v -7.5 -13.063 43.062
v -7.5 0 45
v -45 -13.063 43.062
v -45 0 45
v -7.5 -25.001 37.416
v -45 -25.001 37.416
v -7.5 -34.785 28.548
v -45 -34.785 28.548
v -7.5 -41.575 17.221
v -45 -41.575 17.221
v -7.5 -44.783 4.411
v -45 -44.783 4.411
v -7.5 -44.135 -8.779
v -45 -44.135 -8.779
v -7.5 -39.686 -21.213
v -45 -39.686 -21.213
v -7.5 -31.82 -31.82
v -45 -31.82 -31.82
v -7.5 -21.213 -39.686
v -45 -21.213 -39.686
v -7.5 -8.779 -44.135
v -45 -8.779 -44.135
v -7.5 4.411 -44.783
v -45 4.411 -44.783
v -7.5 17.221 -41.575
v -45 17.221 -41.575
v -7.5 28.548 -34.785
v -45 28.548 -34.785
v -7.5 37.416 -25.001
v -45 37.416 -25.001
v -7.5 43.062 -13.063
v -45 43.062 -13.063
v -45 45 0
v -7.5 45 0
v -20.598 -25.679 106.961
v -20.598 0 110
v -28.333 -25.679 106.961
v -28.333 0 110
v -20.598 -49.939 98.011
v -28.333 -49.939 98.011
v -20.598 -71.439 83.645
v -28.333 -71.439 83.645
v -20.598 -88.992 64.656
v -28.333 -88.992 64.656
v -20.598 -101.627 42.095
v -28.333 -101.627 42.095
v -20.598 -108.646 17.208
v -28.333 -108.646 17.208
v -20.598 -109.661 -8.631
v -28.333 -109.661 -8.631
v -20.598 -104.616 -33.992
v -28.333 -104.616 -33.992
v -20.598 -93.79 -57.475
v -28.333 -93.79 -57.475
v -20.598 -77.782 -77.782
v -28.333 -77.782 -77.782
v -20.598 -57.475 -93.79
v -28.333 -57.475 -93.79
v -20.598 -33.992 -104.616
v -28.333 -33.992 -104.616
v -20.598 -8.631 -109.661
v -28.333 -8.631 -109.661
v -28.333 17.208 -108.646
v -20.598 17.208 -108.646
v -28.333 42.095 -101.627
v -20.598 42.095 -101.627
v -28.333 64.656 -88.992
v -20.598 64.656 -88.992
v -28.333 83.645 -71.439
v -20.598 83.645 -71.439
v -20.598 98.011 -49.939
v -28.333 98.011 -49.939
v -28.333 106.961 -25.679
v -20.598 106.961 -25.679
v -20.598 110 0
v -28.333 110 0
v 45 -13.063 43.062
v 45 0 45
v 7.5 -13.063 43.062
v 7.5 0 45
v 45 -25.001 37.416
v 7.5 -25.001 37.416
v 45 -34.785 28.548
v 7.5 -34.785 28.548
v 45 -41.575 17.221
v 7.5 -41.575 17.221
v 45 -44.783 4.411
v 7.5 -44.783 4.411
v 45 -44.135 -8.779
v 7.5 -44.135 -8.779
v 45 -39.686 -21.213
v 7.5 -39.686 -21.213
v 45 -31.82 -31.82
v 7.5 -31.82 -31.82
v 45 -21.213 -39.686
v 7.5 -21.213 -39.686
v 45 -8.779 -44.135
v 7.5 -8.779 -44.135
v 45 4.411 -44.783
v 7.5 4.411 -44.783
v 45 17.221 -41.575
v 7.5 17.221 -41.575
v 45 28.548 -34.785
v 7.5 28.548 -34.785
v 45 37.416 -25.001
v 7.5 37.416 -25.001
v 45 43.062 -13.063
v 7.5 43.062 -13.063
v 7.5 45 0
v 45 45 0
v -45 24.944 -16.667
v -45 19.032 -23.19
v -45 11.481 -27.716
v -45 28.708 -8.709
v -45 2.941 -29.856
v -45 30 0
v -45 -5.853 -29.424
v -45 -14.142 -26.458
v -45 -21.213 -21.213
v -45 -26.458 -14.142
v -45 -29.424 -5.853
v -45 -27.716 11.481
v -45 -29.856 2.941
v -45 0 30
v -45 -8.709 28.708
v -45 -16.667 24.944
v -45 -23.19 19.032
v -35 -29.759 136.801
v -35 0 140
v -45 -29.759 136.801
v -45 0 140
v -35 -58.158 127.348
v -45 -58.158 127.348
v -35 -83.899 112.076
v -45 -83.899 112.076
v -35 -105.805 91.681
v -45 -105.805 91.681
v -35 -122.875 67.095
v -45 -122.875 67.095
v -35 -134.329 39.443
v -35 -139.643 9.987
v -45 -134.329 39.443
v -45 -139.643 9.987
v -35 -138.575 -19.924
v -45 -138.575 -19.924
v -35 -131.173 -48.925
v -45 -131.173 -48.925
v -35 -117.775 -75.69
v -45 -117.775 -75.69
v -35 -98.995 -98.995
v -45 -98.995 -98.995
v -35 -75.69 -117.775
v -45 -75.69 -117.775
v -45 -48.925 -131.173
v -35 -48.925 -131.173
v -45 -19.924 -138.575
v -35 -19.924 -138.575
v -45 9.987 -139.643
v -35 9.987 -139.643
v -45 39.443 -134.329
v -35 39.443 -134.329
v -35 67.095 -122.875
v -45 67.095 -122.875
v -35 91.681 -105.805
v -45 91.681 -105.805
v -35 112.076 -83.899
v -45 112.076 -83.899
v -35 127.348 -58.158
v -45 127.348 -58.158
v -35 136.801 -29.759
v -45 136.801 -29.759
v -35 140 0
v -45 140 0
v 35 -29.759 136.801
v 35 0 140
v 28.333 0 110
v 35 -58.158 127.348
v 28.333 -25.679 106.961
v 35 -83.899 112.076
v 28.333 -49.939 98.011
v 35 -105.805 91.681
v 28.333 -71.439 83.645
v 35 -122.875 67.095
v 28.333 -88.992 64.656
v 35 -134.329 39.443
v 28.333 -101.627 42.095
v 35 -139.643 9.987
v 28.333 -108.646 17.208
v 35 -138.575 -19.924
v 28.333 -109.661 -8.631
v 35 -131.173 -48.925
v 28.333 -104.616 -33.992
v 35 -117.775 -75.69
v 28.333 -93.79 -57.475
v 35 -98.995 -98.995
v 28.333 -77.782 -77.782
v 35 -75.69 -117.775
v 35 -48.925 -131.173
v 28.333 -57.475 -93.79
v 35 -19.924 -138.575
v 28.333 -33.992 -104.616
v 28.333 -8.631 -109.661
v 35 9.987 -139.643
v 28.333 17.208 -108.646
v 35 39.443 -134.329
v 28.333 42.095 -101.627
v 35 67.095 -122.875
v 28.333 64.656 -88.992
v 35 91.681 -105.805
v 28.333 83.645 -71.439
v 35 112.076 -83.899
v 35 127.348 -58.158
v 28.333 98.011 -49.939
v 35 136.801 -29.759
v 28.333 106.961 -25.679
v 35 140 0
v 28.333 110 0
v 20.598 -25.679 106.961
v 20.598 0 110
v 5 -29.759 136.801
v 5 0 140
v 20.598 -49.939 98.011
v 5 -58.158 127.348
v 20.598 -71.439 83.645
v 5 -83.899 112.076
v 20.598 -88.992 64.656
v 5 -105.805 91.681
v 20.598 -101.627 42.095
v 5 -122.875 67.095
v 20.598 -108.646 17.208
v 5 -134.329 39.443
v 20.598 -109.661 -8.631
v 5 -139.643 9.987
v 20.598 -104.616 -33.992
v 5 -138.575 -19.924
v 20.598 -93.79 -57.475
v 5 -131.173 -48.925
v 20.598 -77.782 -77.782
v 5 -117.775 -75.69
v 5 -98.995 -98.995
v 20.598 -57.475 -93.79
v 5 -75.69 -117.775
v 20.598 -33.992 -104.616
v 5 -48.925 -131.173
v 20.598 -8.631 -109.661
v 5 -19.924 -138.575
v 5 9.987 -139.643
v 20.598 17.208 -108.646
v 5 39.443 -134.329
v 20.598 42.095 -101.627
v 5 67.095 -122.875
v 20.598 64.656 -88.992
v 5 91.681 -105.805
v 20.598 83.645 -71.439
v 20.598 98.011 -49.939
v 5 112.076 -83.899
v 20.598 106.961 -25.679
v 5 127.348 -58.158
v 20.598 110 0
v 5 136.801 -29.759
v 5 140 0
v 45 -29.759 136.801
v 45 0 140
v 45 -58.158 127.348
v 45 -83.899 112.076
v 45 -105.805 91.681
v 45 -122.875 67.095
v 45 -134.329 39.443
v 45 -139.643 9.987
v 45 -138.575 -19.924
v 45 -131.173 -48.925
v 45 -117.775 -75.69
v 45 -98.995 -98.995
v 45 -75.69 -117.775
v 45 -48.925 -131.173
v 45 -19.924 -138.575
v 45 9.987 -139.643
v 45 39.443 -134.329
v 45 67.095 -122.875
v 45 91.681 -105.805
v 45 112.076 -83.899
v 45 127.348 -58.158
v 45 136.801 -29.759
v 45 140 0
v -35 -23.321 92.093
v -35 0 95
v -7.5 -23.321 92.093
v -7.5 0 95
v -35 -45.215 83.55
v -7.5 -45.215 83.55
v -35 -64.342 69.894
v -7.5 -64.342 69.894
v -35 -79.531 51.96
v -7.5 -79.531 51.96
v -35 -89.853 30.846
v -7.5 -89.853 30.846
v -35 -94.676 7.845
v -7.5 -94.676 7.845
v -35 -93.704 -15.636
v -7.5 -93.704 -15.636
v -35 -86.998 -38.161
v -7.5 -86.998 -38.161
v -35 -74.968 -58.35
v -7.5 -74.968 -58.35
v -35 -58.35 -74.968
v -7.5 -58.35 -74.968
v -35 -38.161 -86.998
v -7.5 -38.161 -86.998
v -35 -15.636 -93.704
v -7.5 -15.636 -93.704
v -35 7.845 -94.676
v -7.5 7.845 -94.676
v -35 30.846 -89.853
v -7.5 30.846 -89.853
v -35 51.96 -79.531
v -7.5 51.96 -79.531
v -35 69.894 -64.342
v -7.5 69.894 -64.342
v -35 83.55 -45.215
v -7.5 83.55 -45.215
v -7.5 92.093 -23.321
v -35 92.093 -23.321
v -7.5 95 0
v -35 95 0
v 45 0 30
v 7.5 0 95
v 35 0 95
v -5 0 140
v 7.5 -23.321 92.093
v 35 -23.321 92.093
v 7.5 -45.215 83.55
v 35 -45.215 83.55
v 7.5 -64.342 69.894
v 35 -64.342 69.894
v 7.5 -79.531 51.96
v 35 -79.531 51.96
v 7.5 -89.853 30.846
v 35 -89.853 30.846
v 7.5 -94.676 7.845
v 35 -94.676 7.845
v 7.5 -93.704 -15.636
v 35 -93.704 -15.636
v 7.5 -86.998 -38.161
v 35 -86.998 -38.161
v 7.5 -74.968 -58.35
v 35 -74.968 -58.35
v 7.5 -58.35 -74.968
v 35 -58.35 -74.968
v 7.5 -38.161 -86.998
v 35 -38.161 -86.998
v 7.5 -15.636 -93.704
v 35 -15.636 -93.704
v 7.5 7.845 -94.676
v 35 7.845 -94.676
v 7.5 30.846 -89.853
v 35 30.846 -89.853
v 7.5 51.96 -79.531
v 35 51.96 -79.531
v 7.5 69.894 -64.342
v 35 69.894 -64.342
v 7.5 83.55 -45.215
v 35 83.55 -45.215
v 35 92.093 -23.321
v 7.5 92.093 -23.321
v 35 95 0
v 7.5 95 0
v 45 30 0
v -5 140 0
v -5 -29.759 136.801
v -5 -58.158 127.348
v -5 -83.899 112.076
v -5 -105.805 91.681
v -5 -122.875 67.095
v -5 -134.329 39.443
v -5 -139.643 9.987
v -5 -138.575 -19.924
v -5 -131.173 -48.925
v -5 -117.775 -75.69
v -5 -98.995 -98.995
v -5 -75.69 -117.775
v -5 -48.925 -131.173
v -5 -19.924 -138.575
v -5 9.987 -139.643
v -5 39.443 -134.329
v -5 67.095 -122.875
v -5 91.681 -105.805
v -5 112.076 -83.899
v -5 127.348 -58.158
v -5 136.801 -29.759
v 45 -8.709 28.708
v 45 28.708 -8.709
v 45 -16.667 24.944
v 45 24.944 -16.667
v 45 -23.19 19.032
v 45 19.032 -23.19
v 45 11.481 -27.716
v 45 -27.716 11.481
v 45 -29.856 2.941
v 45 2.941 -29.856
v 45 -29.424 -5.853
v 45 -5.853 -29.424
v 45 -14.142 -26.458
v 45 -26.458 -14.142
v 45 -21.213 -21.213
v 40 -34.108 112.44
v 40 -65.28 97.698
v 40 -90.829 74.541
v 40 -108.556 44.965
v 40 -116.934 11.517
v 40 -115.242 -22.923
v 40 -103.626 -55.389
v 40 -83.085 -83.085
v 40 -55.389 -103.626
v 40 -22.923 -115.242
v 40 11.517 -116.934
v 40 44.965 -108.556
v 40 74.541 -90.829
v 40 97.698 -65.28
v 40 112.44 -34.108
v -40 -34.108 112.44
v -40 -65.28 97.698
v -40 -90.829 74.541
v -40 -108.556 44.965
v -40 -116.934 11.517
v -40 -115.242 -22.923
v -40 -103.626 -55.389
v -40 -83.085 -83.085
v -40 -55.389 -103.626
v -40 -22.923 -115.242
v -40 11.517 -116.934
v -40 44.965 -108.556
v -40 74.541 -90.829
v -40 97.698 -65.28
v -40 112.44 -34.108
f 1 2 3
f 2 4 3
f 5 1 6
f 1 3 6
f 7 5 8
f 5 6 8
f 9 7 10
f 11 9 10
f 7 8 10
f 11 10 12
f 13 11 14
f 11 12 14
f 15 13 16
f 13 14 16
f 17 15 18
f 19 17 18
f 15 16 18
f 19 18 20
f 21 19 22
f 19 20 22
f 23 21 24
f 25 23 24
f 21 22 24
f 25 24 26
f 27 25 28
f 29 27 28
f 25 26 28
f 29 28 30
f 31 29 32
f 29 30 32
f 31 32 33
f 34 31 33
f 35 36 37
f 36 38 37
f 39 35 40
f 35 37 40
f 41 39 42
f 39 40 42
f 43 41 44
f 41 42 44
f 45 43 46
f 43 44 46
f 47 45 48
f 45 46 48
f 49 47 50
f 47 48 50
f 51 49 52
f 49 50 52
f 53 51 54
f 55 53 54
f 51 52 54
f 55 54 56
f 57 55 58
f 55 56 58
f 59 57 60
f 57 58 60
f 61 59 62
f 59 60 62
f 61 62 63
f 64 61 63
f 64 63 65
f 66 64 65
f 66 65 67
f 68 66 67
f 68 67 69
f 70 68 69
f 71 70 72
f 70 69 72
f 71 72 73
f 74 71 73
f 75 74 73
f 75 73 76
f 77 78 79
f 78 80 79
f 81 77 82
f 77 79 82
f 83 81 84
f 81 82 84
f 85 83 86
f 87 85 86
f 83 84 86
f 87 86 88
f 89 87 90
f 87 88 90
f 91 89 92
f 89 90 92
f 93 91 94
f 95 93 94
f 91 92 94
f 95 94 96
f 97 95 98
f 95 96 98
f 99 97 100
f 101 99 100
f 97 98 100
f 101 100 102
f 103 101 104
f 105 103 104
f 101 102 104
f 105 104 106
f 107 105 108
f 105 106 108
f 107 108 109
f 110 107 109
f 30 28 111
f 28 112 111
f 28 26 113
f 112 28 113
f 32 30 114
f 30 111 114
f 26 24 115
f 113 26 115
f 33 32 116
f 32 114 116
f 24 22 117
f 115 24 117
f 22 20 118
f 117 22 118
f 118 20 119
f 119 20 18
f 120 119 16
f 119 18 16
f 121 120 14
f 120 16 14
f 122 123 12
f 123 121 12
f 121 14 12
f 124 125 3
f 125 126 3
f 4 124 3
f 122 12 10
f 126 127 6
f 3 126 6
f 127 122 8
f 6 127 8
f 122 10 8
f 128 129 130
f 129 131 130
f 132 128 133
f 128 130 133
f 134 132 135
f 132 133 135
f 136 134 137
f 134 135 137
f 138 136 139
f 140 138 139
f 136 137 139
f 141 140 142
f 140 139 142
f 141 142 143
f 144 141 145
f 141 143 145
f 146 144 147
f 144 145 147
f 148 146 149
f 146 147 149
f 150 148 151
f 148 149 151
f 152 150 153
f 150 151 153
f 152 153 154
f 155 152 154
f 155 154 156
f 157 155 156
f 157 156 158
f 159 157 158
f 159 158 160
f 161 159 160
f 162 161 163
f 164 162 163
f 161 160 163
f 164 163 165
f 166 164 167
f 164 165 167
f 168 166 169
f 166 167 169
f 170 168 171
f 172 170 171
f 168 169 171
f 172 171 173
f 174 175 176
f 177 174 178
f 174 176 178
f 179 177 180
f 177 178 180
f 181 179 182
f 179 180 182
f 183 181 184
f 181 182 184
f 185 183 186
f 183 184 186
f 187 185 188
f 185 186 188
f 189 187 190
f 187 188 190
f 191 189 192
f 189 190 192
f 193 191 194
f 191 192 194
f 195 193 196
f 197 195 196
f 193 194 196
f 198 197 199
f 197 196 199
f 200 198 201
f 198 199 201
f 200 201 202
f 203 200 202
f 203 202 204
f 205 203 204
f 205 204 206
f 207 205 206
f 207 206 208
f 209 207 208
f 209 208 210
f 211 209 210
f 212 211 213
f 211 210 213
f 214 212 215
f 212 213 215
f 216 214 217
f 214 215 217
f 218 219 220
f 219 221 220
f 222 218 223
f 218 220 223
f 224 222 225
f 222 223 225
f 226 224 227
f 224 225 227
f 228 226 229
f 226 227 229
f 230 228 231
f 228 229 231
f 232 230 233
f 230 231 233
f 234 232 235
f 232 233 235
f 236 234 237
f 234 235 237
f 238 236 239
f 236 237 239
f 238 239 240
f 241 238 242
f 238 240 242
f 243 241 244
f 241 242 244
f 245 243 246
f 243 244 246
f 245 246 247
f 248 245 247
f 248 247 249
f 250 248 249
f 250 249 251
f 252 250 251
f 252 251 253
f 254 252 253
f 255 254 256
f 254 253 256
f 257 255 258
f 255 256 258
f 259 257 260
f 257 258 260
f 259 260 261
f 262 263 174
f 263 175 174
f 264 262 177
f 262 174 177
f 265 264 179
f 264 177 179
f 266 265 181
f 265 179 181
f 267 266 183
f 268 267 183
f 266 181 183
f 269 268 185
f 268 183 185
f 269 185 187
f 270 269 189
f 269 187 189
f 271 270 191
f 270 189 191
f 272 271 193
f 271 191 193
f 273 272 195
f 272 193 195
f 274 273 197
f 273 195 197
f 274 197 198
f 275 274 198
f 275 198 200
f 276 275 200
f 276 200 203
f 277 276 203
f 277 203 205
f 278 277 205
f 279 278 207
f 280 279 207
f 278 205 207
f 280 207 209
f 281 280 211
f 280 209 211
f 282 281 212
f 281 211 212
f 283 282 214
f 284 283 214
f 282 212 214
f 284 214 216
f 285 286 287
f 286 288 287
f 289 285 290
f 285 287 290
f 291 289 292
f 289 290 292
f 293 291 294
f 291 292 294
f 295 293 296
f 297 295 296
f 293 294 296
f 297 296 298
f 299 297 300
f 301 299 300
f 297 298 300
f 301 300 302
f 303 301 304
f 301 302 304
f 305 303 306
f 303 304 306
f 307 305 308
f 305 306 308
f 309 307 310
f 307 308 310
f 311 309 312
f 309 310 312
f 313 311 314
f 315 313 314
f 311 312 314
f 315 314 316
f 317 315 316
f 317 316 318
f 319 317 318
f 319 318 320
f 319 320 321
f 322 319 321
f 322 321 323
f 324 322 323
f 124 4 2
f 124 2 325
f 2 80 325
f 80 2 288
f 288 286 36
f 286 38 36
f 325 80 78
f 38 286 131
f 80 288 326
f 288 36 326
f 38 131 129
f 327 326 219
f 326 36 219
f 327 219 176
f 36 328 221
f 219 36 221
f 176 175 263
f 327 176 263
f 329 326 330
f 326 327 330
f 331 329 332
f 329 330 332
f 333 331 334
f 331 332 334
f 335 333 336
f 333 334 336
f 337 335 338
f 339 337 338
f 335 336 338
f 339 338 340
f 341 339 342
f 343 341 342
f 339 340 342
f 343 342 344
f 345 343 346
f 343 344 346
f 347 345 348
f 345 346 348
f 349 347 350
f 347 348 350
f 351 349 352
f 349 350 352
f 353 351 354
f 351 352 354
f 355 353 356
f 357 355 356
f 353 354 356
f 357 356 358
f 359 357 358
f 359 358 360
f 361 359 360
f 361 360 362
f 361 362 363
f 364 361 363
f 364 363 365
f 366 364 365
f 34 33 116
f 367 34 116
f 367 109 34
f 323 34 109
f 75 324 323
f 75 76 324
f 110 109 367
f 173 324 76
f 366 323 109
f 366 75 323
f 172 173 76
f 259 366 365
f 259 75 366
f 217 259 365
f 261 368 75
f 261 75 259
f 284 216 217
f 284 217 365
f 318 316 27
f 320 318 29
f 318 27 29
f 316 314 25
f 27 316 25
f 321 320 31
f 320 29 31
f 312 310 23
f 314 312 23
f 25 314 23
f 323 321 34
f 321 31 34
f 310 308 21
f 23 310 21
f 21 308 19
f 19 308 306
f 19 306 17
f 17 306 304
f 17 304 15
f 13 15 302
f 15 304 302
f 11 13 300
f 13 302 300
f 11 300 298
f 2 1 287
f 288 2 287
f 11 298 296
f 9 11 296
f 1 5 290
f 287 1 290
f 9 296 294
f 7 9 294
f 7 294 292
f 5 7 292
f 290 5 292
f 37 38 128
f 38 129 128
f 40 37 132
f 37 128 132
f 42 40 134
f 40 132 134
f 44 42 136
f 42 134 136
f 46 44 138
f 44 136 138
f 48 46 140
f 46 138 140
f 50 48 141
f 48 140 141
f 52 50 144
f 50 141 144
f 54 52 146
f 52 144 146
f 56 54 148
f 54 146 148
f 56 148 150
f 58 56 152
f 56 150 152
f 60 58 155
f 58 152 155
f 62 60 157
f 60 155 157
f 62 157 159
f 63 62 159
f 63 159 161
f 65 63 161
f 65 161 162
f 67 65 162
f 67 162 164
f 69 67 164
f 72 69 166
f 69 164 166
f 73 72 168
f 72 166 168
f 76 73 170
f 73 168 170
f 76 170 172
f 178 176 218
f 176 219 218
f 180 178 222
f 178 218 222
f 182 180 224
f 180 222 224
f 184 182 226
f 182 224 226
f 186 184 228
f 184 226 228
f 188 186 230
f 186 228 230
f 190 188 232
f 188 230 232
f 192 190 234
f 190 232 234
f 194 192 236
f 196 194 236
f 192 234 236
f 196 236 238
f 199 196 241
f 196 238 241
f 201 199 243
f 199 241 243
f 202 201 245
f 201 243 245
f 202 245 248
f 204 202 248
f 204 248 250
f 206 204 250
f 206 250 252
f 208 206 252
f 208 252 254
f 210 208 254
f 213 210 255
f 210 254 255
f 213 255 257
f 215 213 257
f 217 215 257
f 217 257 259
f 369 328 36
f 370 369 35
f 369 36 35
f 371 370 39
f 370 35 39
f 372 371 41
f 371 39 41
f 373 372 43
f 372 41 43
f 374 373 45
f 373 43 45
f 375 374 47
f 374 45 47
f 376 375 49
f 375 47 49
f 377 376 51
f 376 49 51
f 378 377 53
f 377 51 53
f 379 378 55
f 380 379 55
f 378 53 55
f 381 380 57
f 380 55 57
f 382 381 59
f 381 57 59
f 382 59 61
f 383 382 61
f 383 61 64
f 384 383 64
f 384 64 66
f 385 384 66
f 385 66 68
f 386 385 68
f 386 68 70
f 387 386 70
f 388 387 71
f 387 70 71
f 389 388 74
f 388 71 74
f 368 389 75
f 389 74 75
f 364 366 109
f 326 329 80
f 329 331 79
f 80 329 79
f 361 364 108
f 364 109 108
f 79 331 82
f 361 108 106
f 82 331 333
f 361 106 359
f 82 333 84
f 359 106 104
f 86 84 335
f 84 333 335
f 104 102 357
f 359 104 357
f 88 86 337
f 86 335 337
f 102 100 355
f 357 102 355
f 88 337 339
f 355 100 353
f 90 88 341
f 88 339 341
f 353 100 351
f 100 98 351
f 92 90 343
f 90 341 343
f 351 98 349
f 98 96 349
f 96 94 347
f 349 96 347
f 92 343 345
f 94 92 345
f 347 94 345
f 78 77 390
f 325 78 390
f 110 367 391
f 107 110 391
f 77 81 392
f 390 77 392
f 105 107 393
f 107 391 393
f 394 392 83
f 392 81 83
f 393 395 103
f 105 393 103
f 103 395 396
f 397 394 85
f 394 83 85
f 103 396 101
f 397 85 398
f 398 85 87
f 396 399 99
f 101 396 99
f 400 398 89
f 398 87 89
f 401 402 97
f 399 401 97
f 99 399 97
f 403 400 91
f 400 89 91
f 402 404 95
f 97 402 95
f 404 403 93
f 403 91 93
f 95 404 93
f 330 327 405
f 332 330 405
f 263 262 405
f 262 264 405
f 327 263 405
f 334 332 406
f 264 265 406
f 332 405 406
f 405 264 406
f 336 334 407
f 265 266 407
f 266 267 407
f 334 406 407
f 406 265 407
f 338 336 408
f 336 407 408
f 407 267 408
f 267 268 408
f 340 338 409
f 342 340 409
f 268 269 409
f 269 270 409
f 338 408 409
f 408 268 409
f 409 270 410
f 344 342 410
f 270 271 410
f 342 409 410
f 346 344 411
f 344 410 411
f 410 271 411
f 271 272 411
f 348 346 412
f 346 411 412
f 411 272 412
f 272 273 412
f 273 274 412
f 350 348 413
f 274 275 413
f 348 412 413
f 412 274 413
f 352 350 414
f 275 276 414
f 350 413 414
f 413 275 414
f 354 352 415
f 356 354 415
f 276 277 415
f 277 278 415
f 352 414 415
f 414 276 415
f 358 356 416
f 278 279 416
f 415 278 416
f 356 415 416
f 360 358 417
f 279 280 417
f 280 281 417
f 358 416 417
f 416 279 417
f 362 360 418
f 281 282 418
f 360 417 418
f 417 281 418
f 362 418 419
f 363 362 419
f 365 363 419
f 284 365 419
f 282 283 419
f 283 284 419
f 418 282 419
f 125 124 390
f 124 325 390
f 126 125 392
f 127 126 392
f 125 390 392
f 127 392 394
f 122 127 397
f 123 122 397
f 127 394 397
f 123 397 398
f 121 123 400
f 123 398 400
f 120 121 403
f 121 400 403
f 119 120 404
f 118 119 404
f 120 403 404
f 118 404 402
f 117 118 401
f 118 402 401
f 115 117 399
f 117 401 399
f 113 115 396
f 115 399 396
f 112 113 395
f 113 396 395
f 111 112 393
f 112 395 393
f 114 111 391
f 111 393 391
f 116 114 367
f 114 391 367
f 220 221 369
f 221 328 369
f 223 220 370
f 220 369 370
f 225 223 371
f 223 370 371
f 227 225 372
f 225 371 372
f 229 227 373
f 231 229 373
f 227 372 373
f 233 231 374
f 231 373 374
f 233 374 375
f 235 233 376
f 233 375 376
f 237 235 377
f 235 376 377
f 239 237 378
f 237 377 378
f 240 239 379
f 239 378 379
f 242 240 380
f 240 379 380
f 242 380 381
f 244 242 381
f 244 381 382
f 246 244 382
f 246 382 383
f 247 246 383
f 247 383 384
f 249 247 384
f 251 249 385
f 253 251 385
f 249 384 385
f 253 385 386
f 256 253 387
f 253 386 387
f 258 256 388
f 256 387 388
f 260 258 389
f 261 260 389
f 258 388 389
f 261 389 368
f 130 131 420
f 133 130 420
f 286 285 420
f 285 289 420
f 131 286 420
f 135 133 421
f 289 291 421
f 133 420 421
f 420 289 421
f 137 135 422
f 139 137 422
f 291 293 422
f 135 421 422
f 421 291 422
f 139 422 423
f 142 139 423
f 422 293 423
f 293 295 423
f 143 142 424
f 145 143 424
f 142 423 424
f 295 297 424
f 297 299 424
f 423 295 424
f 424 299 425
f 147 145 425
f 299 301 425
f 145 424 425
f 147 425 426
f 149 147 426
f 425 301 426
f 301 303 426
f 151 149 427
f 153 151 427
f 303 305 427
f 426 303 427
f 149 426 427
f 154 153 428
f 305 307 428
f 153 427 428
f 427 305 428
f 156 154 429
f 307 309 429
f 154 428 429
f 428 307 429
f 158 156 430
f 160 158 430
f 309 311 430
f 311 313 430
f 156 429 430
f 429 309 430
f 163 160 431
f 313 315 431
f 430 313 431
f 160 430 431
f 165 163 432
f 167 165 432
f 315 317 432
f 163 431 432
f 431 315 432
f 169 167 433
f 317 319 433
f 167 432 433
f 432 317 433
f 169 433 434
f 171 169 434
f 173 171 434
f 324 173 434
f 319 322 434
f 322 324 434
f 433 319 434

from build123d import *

# Parameters (mm, degrees)
REVOLUTION_ANGLE = 270


with BuildPart() as part:
    # Sketch → Revolution (revolve)
    with BuildSketch(Plane.XZ):
        Polygon((-45, 30), (45, 30), (45, 45), (7.5, 45), (7.5, 95), (35, 95), (45, 140), (35, 140), (28.333333, 110), (20.597845, 110), (5, 140), (-5, 140), (-20.597845, 110), (-28.333333, 110), (-35, 140), (-45, 140), (-35, 95), (-7.5, 95), (-7.5, 45), (-45, 45), align=None)
    revolve(axis=Axis((0, 0, 0), (1, 0, 0)), revolution_arc=REVOLUTION_ANGLE)


solid = part.part
